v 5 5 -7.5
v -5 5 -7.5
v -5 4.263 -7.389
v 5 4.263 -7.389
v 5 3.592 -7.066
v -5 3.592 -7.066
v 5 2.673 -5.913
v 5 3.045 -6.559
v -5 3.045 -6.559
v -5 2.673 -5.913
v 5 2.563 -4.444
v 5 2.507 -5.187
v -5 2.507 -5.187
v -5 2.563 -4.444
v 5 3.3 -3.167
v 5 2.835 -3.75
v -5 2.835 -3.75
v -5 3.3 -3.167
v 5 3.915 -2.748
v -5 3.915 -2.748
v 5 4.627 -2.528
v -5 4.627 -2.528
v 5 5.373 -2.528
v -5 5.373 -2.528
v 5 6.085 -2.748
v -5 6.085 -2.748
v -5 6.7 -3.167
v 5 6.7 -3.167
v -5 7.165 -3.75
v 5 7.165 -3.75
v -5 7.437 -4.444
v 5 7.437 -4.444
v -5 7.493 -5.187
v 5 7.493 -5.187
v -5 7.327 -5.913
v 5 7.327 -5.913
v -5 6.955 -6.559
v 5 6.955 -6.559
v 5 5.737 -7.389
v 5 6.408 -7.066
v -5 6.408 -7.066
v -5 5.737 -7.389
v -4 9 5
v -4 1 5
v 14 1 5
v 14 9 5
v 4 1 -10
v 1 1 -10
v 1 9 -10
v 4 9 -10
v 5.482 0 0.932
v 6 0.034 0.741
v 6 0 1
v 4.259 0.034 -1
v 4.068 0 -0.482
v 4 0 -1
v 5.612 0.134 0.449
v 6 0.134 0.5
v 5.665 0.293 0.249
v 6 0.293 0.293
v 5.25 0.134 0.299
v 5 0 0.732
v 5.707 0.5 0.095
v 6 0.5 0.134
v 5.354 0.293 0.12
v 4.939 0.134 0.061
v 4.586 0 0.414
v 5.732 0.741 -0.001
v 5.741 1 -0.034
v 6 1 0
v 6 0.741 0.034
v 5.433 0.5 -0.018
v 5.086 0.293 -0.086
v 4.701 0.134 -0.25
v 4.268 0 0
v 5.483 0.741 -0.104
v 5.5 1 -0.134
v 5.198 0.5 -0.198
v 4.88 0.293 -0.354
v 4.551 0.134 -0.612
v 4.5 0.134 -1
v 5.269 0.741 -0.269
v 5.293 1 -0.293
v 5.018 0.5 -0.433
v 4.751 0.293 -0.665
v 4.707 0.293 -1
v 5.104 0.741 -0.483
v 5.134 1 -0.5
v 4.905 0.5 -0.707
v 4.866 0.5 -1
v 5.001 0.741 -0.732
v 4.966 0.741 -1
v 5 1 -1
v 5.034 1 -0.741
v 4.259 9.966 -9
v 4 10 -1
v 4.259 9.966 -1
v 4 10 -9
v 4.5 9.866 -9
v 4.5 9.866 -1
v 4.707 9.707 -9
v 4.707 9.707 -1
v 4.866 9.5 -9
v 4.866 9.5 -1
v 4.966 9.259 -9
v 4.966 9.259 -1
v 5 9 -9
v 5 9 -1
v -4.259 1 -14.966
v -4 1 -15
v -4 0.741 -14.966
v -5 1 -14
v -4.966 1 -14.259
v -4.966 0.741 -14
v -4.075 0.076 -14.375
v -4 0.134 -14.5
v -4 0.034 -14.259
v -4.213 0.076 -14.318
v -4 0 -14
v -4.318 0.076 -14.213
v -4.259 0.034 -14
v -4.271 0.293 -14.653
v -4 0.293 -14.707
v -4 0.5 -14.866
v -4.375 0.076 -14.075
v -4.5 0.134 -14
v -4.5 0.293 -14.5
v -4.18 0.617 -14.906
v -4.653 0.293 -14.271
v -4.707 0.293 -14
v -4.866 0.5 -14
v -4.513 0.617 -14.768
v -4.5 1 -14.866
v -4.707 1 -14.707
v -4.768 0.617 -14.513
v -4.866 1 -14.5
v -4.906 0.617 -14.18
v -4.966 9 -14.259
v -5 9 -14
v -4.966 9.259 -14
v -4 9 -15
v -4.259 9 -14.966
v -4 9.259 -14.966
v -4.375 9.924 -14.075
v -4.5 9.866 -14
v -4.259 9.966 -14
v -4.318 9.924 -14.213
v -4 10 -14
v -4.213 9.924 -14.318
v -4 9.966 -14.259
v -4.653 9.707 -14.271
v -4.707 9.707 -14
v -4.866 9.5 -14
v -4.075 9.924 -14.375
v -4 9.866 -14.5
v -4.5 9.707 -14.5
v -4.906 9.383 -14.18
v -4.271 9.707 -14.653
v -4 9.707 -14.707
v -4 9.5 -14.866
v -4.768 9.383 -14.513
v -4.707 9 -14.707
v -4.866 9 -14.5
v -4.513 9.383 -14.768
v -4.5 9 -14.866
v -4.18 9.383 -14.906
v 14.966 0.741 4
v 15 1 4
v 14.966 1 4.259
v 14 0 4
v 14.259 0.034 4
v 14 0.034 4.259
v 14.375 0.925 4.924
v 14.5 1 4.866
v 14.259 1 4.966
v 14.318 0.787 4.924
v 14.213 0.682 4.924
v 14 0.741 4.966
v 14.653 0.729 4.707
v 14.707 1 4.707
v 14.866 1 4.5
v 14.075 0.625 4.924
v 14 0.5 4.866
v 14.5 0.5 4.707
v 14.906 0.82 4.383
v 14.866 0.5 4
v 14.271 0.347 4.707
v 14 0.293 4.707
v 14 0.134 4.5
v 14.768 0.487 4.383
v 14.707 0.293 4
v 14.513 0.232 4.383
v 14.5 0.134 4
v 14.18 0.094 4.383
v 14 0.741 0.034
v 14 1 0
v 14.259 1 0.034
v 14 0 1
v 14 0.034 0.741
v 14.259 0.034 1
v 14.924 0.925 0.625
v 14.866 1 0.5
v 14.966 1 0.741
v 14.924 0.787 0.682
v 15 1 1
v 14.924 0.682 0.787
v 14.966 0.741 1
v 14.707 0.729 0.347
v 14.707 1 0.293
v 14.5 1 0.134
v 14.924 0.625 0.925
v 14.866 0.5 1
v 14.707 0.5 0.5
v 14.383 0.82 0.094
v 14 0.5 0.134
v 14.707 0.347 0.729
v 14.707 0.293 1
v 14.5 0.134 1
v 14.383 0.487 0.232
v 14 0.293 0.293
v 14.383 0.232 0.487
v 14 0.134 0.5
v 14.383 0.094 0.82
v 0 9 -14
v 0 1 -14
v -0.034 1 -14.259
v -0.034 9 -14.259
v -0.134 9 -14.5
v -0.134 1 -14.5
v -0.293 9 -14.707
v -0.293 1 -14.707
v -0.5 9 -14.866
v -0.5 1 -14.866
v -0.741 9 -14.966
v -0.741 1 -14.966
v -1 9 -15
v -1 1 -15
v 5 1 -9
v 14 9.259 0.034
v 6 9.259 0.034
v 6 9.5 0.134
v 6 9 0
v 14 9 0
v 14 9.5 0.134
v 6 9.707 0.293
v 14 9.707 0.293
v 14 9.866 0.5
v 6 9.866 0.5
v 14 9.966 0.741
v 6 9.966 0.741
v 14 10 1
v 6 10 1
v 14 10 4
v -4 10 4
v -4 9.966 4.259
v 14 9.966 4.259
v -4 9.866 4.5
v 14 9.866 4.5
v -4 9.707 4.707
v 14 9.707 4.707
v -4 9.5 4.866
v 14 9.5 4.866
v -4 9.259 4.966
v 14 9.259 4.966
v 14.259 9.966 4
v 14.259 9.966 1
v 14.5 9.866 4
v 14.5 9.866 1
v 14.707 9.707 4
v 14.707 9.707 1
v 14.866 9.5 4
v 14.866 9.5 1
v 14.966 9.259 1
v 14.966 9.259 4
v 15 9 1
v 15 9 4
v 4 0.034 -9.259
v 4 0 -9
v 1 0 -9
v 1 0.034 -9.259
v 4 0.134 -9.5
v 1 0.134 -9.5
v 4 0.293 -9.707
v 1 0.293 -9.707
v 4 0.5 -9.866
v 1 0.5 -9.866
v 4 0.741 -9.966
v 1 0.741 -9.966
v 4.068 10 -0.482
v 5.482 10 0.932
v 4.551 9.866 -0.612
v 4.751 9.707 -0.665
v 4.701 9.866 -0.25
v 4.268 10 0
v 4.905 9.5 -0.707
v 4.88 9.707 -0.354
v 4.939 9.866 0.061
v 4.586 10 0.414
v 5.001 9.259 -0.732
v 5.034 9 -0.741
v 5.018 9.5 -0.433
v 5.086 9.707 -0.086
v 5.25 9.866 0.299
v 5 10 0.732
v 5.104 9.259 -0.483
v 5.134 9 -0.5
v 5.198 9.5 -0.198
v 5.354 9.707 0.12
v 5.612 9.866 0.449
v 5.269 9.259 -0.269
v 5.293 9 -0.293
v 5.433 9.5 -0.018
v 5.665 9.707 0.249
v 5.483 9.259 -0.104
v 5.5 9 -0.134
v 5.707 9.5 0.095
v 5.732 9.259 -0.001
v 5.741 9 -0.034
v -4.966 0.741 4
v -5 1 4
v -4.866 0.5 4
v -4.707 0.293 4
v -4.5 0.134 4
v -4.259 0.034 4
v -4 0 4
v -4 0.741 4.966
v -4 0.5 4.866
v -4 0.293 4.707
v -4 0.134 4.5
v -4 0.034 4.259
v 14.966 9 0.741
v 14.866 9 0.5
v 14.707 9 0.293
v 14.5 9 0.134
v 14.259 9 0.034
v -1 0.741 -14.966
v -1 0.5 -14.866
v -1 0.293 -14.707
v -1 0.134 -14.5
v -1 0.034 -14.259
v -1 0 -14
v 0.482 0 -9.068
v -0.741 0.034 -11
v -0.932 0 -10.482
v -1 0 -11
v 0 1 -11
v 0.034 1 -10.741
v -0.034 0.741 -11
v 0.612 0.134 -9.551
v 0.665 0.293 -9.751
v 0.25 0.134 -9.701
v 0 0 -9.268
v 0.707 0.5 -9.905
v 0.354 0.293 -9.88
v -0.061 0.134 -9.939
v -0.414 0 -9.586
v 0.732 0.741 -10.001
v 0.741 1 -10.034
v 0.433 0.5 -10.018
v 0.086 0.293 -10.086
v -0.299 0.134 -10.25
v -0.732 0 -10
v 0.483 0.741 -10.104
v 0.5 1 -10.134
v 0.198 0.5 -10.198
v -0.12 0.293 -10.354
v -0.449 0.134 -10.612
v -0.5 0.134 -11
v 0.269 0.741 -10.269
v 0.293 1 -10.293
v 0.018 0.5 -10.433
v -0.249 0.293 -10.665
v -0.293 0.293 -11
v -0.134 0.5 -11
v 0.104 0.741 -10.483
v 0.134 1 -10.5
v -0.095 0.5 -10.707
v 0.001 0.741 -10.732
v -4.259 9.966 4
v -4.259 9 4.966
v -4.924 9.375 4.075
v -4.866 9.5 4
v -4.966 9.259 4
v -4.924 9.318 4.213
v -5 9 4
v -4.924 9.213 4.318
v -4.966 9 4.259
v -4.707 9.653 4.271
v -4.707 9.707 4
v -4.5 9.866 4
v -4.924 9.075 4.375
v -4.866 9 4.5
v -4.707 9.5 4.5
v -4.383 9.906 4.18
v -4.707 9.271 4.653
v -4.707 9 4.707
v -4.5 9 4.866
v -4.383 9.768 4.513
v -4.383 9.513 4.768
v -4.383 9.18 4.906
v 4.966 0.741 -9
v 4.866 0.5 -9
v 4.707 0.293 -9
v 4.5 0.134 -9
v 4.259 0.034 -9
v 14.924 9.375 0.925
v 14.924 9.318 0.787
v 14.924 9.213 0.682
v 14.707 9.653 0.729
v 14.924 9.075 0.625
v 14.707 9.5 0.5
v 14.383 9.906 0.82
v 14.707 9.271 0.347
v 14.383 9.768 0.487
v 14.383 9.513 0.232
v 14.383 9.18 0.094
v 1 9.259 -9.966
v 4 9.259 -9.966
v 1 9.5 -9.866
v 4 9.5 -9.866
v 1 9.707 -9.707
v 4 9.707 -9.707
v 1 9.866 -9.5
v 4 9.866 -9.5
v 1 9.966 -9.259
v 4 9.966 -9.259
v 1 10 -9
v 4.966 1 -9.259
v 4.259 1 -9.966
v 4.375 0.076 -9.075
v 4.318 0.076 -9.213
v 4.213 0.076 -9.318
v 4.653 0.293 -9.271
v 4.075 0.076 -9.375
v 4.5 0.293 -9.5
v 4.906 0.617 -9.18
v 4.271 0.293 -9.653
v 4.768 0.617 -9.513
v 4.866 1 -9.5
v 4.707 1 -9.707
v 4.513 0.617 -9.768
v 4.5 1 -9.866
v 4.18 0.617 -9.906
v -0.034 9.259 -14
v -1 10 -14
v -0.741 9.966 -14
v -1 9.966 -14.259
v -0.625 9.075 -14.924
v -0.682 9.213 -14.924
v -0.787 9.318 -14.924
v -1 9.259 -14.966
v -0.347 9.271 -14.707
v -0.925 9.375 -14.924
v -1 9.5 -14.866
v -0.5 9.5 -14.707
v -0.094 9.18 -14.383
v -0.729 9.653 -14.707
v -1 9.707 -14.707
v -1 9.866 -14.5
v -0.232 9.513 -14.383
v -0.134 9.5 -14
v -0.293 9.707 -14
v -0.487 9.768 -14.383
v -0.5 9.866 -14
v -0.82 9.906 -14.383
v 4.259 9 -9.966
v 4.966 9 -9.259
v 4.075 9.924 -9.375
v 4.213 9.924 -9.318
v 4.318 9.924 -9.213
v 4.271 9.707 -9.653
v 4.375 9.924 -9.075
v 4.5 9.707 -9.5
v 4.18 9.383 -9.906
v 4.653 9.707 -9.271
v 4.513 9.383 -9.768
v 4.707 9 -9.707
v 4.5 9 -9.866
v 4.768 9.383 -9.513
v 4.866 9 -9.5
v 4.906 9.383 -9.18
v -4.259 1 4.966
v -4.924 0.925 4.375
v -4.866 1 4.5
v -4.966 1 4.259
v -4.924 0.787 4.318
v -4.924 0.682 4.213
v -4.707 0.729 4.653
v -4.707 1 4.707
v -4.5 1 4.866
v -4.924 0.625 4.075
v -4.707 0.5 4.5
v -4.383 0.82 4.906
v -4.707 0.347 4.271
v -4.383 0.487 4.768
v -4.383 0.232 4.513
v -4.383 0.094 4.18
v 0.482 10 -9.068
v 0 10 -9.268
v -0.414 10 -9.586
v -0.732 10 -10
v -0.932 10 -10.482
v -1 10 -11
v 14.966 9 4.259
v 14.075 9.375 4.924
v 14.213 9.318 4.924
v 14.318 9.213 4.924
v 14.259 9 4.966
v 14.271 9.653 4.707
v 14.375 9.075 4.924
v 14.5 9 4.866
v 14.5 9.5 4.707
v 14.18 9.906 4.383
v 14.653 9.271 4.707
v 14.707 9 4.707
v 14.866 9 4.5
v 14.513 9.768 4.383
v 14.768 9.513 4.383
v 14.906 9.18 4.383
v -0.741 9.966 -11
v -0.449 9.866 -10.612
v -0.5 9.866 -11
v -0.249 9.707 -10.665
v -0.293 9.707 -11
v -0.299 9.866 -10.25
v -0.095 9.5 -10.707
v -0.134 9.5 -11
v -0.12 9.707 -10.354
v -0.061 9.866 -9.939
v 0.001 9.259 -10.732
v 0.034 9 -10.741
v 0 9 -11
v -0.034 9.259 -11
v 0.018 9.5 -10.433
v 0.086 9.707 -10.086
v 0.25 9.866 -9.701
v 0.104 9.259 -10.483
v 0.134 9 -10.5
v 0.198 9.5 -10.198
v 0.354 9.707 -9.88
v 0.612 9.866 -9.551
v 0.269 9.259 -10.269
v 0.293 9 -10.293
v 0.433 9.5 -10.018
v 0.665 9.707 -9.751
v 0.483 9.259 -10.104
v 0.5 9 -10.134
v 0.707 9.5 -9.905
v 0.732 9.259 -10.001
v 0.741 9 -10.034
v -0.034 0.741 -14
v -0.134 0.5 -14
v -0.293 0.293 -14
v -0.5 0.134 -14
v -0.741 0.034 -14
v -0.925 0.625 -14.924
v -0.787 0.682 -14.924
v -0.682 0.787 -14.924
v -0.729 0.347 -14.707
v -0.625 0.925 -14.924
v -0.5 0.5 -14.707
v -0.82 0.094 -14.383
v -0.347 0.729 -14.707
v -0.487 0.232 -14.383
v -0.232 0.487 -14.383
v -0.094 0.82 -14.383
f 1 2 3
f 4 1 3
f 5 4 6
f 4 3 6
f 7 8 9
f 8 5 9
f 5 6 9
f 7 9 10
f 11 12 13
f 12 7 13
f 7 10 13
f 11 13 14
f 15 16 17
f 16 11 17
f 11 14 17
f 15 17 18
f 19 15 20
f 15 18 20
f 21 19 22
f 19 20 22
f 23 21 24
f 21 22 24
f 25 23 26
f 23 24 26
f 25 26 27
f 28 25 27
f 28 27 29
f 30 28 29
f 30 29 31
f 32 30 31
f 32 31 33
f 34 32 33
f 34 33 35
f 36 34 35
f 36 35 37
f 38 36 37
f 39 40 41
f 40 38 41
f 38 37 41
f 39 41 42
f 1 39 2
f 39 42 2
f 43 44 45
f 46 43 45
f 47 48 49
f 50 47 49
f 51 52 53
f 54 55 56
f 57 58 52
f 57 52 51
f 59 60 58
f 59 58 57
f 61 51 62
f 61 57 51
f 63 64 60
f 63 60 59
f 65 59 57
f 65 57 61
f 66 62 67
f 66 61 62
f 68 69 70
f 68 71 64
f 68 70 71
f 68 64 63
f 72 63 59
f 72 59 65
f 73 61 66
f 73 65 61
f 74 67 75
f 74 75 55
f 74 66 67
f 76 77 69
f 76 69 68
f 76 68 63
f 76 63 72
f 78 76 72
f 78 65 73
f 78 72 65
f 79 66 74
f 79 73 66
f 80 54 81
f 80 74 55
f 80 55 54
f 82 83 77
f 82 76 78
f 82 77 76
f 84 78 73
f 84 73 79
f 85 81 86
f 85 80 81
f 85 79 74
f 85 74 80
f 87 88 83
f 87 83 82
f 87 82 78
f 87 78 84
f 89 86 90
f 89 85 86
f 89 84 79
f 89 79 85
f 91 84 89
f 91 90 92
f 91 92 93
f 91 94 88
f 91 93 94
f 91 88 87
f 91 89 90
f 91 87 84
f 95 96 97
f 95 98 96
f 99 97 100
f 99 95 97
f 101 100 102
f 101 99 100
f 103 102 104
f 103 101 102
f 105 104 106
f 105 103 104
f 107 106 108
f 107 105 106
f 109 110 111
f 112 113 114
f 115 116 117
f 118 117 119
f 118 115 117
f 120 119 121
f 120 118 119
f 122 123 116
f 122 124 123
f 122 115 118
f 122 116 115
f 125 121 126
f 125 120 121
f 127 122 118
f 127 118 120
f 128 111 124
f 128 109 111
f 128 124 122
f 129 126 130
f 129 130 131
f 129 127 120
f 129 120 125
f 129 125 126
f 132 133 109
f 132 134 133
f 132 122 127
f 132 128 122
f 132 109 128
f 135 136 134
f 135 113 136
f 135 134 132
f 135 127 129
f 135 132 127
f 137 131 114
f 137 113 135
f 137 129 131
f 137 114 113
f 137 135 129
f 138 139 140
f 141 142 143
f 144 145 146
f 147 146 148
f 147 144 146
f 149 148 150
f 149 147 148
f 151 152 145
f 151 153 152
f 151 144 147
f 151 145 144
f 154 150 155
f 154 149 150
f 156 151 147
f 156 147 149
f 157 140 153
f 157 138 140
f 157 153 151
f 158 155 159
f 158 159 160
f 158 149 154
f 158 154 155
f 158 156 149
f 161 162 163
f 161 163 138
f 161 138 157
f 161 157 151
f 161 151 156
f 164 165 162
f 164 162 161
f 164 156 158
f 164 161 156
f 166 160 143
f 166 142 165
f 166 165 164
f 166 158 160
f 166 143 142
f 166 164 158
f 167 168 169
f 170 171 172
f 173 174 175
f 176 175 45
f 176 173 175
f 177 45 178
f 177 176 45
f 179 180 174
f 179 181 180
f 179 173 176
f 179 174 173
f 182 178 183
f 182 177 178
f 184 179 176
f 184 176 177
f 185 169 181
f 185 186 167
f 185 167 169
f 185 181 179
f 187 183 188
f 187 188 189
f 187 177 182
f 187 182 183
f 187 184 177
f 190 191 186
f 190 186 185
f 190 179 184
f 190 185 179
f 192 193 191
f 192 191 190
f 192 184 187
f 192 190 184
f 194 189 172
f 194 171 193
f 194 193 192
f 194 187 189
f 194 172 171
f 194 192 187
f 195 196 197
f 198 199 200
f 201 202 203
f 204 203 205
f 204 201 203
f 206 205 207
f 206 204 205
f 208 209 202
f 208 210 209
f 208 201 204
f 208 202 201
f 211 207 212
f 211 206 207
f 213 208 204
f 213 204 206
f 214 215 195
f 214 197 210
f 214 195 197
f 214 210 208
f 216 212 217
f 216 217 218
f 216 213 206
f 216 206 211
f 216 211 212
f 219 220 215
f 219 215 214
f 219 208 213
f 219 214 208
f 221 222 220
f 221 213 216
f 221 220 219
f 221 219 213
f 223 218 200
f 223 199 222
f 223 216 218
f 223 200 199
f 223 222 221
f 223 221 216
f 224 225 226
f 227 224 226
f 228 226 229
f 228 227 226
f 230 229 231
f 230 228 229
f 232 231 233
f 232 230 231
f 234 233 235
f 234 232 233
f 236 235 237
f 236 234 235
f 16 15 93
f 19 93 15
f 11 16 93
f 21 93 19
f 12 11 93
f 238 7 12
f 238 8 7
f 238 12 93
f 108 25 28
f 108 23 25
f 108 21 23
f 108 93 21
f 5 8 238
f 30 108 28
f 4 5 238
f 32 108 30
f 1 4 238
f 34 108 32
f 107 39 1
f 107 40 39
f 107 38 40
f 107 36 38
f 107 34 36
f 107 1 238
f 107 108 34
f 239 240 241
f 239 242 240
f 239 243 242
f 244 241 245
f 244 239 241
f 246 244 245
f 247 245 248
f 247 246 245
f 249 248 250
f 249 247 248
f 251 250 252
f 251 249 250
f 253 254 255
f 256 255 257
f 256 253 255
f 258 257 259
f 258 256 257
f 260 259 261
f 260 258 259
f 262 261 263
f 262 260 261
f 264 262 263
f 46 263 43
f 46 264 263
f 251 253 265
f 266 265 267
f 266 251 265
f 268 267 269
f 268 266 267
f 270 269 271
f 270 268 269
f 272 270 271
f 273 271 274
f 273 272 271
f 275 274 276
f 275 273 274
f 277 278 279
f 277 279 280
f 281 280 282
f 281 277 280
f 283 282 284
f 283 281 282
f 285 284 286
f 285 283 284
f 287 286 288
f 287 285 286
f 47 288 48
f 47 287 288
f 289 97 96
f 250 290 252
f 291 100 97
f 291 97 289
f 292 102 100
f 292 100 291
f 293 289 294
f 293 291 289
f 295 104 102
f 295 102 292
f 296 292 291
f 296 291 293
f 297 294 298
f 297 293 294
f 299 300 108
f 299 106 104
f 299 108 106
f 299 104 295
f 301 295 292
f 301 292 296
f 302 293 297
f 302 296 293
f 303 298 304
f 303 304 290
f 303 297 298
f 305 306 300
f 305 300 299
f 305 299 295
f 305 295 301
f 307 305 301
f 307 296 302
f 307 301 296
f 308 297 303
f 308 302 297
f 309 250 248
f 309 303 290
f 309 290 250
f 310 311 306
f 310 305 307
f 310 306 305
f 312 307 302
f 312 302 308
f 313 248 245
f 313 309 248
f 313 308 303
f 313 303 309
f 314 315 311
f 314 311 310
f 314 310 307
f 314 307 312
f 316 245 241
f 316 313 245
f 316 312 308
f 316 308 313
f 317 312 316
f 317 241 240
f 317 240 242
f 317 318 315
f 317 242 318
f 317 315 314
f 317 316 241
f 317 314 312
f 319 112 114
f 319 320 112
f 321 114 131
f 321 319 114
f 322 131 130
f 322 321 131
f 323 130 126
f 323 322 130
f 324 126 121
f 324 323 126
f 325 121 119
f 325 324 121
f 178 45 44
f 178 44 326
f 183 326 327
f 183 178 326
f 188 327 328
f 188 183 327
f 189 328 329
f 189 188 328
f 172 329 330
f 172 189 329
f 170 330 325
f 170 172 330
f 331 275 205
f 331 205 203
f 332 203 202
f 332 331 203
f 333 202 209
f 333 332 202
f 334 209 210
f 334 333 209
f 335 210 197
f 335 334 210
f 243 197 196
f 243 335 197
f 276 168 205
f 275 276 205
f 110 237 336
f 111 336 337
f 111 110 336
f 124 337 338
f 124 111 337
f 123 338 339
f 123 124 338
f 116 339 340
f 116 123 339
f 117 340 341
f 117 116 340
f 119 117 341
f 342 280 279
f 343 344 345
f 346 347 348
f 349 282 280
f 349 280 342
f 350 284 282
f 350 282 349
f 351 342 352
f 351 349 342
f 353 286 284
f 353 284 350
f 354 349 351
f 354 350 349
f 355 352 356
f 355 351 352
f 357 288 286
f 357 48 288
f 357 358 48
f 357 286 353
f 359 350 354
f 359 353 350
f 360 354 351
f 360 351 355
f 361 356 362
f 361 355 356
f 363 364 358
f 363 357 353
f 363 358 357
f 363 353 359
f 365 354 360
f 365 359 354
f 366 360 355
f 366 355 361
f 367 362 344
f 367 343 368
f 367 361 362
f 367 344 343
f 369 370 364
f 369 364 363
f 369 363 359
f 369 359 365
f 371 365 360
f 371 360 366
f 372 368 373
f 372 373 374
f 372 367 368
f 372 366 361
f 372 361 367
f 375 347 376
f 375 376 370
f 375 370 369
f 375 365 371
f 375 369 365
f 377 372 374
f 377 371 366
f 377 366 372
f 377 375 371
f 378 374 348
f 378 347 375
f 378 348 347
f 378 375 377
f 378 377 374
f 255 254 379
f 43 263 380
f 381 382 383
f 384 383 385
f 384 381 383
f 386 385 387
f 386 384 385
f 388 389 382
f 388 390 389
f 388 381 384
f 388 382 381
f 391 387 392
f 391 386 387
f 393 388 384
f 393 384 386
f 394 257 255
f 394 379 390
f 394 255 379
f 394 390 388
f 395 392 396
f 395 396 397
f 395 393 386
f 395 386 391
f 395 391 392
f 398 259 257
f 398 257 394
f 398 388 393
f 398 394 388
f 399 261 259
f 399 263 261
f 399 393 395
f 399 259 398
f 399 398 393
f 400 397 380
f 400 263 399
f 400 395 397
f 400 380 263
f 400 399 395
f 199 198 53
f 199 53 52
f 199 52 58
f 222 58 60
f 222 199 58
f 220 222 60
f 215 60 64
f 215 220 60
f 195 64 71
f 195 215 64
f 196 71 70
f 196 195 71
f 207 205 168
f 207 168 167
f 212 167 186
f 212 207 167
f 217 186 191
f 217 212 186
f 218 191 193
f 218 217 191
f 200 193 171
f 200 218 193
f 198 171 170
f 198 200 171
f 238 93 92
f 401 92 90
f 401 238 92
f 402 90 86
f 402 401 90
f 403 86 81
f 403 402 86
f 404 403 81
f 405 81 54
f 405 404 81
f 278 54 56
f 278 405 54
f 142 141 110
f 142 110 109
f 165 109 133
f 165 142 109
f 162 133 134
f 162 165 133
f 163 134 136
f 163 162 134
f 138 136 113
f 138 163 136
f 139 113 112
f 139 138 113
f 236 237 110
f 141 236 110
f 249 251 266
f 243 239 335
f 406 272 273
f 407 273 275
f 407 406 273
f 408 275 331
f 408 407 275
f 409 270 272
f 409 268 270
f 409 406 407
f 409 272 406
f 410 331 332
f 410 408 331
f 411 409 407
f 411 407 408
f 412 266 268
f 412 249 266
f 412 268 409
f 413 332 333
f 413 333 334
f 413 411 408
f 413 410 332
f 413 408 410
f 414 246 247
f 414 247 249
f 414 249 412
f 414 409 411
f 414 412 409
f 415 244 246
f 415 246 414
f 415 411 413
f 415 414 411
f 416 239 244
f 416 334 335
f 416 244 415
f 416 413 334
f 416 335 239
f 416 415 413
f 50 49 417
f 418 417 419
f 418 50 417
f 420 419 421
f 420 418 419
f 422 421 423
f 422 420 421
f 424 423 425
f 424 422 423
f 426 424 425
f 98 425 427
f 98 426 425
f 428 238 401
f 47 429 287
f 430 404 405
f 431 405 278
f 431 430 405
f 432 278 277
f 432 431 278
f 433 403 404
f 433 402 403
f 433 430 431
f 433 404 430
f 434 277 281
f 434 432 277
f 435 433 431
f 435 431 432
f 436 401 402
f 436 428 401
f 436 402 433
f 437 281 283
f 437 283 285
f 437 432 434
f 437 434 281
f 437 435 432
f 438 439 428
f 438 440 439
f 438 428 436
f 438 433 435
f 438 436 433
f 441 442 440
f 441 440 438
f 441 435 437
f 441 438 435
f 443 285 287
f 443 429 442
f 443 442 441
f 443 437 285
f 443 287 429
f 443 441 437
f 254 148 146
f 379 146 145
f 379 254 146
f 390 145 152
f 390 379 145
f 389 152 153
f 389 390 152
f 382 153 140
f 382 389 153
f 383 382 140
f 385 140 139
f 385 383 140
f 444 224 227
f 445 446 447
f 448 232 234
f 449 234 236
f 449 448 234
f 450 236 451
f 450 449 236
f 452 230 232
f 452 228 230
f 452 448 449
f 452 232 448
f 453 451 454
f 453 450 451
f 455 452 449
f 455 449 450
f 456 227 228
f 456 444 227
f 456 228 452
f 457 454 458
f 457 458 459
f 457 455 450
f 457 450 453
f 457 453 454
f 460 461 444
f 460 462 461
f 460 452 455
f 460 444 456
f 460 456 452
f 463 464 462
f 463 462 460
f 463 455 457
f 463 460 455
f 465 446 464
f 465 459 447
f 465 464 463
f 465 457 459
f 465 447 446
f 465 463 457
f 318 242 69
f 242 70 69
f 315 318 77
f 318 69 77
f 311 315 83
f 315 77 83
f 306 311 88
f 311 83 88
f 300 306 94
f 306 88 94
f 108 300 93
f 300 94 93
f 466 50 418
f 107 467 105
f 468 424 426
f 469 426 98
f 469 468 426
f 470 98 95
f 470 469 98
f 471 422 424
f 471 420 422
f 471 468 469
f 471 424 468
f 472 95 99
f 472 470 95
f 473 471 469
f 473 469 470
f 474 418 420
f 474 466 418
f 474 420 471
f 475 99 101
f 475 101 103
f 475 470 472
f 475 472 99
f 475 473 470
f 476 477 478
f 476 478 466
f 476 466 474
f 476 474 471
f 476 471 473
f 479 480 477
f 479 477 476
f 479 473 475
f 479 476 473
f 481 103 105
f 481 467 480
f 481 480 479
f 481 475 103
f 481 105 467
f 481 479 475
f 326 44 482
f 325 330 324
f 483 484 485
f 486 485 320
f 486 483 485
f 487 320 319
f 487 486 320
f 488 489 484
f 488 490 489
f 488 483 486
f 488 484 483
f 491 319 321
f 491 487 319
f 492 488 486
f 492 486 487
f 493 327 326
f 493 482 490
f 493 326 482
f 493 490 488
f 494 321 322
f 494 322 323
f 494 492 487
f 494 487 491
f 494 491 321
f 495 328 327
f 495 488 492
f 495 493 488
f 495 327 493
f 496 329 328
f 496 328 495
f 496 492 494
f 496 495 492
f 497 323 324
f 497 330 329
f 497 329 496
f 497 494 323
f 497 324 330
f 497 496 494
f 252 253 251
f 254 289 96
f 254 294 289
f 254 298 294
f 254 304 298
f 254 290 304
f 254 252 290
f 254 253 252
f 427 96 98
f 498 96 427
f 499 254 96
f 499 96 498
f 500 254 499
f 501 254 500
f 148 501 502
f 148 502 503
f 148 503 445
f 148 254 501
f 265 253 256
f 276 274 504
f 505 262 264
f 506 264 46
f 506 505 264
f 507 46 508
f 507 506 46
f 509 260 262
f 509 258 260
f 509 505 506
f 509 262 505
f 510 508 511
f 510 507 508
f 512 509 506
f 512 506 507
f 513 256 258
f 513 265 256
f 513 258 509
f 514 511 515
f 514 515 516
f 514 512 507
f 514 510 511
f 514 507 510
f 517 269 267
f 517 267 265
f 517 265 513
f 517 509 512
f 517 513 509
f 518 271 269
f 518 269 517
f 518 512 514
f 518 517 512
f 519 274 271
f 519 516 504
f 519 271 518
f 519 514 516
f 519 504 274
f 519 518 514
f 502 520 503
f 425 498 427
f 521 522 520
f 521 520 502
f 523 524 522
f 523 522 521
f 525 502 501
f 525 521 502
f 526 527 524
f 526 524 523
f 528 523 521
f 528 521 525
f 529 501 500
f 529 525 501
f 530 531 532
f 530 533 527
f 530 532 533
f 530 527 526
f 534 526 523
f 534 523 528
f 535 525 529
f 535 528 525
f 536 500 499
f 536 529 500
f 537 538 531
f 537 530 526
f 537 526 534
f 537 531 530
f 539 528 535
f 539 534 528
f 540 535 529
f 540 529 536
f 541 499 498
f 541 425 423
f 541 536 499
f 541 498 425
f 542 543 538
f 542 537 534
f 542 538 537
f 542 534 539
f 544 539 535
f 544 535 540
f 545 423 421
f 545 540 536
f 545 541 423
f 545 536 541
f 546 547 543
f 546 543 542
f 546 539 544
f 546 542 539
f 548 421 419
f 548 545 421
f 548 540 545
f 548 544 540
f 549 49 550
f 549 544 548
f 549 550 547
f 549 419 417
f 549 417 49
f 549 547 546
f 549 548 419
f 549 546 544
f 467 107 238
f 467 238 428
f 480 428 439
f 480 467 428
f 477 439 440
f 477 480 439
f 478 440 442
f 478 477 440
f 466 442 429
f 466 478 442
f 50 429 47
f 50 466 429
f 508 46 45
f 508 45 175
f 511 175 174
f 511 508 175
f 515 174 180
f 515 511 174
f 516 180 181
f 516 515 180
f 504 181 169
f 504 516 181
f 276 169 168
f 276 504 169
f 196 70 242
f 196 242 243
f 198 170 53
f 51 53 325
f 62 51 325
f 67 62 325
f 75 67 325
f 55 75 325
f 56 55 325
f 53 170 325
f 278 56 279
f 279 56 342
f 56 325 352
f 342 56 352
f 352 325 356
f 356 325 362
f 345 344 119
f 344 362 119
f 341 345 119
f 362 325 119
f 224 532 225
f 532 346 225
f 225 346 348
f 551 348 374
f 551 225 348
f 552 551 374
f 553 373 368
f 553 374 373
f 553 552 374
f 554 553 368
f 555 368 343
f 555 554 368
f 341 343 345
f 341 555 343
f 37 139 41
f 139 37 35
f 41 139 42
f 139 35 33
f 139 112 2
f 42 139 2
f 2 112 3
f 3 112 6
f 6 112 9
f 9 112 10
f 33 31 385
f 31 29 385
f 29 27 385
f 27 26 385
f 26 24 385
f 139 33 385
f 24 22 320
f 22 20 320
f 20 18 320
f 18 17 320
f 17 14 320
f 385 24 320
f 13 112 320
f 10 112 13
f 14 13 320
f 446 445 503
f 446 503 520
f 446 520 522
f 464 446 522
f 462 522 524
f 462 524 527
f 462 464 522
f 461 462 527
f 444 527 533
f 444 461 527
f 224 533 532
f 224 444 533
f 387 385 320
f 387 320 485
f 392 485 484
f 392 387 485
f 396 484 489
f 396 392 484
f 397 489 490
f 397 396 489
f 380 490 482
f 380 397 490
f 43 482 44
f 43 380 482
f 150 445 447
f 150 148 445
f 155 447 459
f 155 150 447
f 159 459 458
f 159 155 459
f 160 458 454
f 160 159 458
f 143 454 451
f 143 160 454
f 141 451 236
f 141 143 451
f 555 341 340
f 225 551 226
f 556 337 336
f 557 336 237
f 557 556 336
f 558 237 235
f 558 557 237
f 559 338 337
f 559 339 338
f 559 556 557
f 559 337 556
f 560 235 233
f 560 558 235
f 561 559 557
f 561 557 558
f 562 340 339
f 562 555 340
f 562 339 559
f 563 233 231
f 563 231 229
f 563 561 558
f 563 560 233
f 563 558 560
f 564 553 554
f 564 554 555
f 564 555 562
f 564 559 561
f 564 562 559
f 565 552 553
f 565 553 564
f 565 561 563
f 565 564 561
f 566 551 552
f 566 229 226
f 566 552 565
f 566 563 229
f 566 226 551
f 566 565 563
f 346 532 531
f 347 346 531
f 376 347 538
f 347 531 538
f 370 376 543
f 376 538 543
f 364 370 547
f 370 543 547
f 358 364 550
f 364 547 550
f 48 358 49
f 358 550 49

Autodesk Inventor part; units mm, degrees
ref_plane "YZ Plane" through (0, 0, 0) normal (1, 0, 0) x (0, 1, 0)
ref_plane "XZ Plane" through (0, 0, 0) normal (0, 1, 0) x (-1, 0, 0)
ref_plane "XY Plane" through (0, 0, 0) normal (0, 0, 1) x (1, 0, 0)
sketch "Sketch2" plane through (0, 0, 0) normal (0, 1, 0) x (-1, 0, 0)
  line L0 (0, 0) -> (0, -15)
  line L1 (0, 0) -> (-15, 0)
  line L2 (0, -15) -> (5, -15)
  line L3 (5, -15) -> (5, 5)
  line L4 (5, 5) -> (-15, 5)
  line L5 (-15, 5) -> (-15, 0)
  dimension "d0" = 15
  dimension "d1" = 15
  dimension "d3" = 5
  dimension "d4" = 20
  dimension "d5" = 90
  dimension "d6" = 20
extrude "Extrusion1" add sketch "Sketch2" along normal blind 10
sketch "Sketch3" plane through (0, 0, 0) normal (1, 0, 0) x (0, 0, -1)
  line L0 (15, 0) -> (15, 10) construction
  line L1 (15, 5) -> (-5, 5) construction
  circle A0 centre (5, 5) radius 2.5
  line L2 (0, 0) -> (15, 0) projected
  line L3 (0, 10) -> (15, 10) projected
  line L4 (0, 0) -> (10, 0)
  line L5 (10, 0) -> (10, 10)
  line L6 (10, 10) -> (0, 10)
  line L7 (0, 10) -> (0, 0)
  dimension "d9" = 5
  dimension "d10" = 10
  dimension "d17" = 10
extrude "Extrusion2" cut sketch "Sketch3" against normal blind 5 contours A0
extrude "Extrusion3" add sketch "Sketch3" along normal blind 5
fillet "Fillet2" radius 1 24 edges at (5, 5, -10) (5, 10, -5) (5, 0, -5) (10, 10, 0) (5, 5, 0) (10, 0, 0) (15, 5, 0) (15, 10, 2.5) (15, 0, 2.5) (15, 5, 5) (2.5, 10, -10) (0, 10, -12.5) (0, 5, -10) (0, 0, -12.5) (0, 5, -15) (-5, 5, -15) (-2.5, 10, -15) (-2.5, 0, -15) (5, 10, 5) (-5, 10, -5) (2.5, 0, -10) (5, 0, 5) (-5, 0, -5) (-5, 5, 5)
properties part number "support" material "Plastic, Opaque Black"
